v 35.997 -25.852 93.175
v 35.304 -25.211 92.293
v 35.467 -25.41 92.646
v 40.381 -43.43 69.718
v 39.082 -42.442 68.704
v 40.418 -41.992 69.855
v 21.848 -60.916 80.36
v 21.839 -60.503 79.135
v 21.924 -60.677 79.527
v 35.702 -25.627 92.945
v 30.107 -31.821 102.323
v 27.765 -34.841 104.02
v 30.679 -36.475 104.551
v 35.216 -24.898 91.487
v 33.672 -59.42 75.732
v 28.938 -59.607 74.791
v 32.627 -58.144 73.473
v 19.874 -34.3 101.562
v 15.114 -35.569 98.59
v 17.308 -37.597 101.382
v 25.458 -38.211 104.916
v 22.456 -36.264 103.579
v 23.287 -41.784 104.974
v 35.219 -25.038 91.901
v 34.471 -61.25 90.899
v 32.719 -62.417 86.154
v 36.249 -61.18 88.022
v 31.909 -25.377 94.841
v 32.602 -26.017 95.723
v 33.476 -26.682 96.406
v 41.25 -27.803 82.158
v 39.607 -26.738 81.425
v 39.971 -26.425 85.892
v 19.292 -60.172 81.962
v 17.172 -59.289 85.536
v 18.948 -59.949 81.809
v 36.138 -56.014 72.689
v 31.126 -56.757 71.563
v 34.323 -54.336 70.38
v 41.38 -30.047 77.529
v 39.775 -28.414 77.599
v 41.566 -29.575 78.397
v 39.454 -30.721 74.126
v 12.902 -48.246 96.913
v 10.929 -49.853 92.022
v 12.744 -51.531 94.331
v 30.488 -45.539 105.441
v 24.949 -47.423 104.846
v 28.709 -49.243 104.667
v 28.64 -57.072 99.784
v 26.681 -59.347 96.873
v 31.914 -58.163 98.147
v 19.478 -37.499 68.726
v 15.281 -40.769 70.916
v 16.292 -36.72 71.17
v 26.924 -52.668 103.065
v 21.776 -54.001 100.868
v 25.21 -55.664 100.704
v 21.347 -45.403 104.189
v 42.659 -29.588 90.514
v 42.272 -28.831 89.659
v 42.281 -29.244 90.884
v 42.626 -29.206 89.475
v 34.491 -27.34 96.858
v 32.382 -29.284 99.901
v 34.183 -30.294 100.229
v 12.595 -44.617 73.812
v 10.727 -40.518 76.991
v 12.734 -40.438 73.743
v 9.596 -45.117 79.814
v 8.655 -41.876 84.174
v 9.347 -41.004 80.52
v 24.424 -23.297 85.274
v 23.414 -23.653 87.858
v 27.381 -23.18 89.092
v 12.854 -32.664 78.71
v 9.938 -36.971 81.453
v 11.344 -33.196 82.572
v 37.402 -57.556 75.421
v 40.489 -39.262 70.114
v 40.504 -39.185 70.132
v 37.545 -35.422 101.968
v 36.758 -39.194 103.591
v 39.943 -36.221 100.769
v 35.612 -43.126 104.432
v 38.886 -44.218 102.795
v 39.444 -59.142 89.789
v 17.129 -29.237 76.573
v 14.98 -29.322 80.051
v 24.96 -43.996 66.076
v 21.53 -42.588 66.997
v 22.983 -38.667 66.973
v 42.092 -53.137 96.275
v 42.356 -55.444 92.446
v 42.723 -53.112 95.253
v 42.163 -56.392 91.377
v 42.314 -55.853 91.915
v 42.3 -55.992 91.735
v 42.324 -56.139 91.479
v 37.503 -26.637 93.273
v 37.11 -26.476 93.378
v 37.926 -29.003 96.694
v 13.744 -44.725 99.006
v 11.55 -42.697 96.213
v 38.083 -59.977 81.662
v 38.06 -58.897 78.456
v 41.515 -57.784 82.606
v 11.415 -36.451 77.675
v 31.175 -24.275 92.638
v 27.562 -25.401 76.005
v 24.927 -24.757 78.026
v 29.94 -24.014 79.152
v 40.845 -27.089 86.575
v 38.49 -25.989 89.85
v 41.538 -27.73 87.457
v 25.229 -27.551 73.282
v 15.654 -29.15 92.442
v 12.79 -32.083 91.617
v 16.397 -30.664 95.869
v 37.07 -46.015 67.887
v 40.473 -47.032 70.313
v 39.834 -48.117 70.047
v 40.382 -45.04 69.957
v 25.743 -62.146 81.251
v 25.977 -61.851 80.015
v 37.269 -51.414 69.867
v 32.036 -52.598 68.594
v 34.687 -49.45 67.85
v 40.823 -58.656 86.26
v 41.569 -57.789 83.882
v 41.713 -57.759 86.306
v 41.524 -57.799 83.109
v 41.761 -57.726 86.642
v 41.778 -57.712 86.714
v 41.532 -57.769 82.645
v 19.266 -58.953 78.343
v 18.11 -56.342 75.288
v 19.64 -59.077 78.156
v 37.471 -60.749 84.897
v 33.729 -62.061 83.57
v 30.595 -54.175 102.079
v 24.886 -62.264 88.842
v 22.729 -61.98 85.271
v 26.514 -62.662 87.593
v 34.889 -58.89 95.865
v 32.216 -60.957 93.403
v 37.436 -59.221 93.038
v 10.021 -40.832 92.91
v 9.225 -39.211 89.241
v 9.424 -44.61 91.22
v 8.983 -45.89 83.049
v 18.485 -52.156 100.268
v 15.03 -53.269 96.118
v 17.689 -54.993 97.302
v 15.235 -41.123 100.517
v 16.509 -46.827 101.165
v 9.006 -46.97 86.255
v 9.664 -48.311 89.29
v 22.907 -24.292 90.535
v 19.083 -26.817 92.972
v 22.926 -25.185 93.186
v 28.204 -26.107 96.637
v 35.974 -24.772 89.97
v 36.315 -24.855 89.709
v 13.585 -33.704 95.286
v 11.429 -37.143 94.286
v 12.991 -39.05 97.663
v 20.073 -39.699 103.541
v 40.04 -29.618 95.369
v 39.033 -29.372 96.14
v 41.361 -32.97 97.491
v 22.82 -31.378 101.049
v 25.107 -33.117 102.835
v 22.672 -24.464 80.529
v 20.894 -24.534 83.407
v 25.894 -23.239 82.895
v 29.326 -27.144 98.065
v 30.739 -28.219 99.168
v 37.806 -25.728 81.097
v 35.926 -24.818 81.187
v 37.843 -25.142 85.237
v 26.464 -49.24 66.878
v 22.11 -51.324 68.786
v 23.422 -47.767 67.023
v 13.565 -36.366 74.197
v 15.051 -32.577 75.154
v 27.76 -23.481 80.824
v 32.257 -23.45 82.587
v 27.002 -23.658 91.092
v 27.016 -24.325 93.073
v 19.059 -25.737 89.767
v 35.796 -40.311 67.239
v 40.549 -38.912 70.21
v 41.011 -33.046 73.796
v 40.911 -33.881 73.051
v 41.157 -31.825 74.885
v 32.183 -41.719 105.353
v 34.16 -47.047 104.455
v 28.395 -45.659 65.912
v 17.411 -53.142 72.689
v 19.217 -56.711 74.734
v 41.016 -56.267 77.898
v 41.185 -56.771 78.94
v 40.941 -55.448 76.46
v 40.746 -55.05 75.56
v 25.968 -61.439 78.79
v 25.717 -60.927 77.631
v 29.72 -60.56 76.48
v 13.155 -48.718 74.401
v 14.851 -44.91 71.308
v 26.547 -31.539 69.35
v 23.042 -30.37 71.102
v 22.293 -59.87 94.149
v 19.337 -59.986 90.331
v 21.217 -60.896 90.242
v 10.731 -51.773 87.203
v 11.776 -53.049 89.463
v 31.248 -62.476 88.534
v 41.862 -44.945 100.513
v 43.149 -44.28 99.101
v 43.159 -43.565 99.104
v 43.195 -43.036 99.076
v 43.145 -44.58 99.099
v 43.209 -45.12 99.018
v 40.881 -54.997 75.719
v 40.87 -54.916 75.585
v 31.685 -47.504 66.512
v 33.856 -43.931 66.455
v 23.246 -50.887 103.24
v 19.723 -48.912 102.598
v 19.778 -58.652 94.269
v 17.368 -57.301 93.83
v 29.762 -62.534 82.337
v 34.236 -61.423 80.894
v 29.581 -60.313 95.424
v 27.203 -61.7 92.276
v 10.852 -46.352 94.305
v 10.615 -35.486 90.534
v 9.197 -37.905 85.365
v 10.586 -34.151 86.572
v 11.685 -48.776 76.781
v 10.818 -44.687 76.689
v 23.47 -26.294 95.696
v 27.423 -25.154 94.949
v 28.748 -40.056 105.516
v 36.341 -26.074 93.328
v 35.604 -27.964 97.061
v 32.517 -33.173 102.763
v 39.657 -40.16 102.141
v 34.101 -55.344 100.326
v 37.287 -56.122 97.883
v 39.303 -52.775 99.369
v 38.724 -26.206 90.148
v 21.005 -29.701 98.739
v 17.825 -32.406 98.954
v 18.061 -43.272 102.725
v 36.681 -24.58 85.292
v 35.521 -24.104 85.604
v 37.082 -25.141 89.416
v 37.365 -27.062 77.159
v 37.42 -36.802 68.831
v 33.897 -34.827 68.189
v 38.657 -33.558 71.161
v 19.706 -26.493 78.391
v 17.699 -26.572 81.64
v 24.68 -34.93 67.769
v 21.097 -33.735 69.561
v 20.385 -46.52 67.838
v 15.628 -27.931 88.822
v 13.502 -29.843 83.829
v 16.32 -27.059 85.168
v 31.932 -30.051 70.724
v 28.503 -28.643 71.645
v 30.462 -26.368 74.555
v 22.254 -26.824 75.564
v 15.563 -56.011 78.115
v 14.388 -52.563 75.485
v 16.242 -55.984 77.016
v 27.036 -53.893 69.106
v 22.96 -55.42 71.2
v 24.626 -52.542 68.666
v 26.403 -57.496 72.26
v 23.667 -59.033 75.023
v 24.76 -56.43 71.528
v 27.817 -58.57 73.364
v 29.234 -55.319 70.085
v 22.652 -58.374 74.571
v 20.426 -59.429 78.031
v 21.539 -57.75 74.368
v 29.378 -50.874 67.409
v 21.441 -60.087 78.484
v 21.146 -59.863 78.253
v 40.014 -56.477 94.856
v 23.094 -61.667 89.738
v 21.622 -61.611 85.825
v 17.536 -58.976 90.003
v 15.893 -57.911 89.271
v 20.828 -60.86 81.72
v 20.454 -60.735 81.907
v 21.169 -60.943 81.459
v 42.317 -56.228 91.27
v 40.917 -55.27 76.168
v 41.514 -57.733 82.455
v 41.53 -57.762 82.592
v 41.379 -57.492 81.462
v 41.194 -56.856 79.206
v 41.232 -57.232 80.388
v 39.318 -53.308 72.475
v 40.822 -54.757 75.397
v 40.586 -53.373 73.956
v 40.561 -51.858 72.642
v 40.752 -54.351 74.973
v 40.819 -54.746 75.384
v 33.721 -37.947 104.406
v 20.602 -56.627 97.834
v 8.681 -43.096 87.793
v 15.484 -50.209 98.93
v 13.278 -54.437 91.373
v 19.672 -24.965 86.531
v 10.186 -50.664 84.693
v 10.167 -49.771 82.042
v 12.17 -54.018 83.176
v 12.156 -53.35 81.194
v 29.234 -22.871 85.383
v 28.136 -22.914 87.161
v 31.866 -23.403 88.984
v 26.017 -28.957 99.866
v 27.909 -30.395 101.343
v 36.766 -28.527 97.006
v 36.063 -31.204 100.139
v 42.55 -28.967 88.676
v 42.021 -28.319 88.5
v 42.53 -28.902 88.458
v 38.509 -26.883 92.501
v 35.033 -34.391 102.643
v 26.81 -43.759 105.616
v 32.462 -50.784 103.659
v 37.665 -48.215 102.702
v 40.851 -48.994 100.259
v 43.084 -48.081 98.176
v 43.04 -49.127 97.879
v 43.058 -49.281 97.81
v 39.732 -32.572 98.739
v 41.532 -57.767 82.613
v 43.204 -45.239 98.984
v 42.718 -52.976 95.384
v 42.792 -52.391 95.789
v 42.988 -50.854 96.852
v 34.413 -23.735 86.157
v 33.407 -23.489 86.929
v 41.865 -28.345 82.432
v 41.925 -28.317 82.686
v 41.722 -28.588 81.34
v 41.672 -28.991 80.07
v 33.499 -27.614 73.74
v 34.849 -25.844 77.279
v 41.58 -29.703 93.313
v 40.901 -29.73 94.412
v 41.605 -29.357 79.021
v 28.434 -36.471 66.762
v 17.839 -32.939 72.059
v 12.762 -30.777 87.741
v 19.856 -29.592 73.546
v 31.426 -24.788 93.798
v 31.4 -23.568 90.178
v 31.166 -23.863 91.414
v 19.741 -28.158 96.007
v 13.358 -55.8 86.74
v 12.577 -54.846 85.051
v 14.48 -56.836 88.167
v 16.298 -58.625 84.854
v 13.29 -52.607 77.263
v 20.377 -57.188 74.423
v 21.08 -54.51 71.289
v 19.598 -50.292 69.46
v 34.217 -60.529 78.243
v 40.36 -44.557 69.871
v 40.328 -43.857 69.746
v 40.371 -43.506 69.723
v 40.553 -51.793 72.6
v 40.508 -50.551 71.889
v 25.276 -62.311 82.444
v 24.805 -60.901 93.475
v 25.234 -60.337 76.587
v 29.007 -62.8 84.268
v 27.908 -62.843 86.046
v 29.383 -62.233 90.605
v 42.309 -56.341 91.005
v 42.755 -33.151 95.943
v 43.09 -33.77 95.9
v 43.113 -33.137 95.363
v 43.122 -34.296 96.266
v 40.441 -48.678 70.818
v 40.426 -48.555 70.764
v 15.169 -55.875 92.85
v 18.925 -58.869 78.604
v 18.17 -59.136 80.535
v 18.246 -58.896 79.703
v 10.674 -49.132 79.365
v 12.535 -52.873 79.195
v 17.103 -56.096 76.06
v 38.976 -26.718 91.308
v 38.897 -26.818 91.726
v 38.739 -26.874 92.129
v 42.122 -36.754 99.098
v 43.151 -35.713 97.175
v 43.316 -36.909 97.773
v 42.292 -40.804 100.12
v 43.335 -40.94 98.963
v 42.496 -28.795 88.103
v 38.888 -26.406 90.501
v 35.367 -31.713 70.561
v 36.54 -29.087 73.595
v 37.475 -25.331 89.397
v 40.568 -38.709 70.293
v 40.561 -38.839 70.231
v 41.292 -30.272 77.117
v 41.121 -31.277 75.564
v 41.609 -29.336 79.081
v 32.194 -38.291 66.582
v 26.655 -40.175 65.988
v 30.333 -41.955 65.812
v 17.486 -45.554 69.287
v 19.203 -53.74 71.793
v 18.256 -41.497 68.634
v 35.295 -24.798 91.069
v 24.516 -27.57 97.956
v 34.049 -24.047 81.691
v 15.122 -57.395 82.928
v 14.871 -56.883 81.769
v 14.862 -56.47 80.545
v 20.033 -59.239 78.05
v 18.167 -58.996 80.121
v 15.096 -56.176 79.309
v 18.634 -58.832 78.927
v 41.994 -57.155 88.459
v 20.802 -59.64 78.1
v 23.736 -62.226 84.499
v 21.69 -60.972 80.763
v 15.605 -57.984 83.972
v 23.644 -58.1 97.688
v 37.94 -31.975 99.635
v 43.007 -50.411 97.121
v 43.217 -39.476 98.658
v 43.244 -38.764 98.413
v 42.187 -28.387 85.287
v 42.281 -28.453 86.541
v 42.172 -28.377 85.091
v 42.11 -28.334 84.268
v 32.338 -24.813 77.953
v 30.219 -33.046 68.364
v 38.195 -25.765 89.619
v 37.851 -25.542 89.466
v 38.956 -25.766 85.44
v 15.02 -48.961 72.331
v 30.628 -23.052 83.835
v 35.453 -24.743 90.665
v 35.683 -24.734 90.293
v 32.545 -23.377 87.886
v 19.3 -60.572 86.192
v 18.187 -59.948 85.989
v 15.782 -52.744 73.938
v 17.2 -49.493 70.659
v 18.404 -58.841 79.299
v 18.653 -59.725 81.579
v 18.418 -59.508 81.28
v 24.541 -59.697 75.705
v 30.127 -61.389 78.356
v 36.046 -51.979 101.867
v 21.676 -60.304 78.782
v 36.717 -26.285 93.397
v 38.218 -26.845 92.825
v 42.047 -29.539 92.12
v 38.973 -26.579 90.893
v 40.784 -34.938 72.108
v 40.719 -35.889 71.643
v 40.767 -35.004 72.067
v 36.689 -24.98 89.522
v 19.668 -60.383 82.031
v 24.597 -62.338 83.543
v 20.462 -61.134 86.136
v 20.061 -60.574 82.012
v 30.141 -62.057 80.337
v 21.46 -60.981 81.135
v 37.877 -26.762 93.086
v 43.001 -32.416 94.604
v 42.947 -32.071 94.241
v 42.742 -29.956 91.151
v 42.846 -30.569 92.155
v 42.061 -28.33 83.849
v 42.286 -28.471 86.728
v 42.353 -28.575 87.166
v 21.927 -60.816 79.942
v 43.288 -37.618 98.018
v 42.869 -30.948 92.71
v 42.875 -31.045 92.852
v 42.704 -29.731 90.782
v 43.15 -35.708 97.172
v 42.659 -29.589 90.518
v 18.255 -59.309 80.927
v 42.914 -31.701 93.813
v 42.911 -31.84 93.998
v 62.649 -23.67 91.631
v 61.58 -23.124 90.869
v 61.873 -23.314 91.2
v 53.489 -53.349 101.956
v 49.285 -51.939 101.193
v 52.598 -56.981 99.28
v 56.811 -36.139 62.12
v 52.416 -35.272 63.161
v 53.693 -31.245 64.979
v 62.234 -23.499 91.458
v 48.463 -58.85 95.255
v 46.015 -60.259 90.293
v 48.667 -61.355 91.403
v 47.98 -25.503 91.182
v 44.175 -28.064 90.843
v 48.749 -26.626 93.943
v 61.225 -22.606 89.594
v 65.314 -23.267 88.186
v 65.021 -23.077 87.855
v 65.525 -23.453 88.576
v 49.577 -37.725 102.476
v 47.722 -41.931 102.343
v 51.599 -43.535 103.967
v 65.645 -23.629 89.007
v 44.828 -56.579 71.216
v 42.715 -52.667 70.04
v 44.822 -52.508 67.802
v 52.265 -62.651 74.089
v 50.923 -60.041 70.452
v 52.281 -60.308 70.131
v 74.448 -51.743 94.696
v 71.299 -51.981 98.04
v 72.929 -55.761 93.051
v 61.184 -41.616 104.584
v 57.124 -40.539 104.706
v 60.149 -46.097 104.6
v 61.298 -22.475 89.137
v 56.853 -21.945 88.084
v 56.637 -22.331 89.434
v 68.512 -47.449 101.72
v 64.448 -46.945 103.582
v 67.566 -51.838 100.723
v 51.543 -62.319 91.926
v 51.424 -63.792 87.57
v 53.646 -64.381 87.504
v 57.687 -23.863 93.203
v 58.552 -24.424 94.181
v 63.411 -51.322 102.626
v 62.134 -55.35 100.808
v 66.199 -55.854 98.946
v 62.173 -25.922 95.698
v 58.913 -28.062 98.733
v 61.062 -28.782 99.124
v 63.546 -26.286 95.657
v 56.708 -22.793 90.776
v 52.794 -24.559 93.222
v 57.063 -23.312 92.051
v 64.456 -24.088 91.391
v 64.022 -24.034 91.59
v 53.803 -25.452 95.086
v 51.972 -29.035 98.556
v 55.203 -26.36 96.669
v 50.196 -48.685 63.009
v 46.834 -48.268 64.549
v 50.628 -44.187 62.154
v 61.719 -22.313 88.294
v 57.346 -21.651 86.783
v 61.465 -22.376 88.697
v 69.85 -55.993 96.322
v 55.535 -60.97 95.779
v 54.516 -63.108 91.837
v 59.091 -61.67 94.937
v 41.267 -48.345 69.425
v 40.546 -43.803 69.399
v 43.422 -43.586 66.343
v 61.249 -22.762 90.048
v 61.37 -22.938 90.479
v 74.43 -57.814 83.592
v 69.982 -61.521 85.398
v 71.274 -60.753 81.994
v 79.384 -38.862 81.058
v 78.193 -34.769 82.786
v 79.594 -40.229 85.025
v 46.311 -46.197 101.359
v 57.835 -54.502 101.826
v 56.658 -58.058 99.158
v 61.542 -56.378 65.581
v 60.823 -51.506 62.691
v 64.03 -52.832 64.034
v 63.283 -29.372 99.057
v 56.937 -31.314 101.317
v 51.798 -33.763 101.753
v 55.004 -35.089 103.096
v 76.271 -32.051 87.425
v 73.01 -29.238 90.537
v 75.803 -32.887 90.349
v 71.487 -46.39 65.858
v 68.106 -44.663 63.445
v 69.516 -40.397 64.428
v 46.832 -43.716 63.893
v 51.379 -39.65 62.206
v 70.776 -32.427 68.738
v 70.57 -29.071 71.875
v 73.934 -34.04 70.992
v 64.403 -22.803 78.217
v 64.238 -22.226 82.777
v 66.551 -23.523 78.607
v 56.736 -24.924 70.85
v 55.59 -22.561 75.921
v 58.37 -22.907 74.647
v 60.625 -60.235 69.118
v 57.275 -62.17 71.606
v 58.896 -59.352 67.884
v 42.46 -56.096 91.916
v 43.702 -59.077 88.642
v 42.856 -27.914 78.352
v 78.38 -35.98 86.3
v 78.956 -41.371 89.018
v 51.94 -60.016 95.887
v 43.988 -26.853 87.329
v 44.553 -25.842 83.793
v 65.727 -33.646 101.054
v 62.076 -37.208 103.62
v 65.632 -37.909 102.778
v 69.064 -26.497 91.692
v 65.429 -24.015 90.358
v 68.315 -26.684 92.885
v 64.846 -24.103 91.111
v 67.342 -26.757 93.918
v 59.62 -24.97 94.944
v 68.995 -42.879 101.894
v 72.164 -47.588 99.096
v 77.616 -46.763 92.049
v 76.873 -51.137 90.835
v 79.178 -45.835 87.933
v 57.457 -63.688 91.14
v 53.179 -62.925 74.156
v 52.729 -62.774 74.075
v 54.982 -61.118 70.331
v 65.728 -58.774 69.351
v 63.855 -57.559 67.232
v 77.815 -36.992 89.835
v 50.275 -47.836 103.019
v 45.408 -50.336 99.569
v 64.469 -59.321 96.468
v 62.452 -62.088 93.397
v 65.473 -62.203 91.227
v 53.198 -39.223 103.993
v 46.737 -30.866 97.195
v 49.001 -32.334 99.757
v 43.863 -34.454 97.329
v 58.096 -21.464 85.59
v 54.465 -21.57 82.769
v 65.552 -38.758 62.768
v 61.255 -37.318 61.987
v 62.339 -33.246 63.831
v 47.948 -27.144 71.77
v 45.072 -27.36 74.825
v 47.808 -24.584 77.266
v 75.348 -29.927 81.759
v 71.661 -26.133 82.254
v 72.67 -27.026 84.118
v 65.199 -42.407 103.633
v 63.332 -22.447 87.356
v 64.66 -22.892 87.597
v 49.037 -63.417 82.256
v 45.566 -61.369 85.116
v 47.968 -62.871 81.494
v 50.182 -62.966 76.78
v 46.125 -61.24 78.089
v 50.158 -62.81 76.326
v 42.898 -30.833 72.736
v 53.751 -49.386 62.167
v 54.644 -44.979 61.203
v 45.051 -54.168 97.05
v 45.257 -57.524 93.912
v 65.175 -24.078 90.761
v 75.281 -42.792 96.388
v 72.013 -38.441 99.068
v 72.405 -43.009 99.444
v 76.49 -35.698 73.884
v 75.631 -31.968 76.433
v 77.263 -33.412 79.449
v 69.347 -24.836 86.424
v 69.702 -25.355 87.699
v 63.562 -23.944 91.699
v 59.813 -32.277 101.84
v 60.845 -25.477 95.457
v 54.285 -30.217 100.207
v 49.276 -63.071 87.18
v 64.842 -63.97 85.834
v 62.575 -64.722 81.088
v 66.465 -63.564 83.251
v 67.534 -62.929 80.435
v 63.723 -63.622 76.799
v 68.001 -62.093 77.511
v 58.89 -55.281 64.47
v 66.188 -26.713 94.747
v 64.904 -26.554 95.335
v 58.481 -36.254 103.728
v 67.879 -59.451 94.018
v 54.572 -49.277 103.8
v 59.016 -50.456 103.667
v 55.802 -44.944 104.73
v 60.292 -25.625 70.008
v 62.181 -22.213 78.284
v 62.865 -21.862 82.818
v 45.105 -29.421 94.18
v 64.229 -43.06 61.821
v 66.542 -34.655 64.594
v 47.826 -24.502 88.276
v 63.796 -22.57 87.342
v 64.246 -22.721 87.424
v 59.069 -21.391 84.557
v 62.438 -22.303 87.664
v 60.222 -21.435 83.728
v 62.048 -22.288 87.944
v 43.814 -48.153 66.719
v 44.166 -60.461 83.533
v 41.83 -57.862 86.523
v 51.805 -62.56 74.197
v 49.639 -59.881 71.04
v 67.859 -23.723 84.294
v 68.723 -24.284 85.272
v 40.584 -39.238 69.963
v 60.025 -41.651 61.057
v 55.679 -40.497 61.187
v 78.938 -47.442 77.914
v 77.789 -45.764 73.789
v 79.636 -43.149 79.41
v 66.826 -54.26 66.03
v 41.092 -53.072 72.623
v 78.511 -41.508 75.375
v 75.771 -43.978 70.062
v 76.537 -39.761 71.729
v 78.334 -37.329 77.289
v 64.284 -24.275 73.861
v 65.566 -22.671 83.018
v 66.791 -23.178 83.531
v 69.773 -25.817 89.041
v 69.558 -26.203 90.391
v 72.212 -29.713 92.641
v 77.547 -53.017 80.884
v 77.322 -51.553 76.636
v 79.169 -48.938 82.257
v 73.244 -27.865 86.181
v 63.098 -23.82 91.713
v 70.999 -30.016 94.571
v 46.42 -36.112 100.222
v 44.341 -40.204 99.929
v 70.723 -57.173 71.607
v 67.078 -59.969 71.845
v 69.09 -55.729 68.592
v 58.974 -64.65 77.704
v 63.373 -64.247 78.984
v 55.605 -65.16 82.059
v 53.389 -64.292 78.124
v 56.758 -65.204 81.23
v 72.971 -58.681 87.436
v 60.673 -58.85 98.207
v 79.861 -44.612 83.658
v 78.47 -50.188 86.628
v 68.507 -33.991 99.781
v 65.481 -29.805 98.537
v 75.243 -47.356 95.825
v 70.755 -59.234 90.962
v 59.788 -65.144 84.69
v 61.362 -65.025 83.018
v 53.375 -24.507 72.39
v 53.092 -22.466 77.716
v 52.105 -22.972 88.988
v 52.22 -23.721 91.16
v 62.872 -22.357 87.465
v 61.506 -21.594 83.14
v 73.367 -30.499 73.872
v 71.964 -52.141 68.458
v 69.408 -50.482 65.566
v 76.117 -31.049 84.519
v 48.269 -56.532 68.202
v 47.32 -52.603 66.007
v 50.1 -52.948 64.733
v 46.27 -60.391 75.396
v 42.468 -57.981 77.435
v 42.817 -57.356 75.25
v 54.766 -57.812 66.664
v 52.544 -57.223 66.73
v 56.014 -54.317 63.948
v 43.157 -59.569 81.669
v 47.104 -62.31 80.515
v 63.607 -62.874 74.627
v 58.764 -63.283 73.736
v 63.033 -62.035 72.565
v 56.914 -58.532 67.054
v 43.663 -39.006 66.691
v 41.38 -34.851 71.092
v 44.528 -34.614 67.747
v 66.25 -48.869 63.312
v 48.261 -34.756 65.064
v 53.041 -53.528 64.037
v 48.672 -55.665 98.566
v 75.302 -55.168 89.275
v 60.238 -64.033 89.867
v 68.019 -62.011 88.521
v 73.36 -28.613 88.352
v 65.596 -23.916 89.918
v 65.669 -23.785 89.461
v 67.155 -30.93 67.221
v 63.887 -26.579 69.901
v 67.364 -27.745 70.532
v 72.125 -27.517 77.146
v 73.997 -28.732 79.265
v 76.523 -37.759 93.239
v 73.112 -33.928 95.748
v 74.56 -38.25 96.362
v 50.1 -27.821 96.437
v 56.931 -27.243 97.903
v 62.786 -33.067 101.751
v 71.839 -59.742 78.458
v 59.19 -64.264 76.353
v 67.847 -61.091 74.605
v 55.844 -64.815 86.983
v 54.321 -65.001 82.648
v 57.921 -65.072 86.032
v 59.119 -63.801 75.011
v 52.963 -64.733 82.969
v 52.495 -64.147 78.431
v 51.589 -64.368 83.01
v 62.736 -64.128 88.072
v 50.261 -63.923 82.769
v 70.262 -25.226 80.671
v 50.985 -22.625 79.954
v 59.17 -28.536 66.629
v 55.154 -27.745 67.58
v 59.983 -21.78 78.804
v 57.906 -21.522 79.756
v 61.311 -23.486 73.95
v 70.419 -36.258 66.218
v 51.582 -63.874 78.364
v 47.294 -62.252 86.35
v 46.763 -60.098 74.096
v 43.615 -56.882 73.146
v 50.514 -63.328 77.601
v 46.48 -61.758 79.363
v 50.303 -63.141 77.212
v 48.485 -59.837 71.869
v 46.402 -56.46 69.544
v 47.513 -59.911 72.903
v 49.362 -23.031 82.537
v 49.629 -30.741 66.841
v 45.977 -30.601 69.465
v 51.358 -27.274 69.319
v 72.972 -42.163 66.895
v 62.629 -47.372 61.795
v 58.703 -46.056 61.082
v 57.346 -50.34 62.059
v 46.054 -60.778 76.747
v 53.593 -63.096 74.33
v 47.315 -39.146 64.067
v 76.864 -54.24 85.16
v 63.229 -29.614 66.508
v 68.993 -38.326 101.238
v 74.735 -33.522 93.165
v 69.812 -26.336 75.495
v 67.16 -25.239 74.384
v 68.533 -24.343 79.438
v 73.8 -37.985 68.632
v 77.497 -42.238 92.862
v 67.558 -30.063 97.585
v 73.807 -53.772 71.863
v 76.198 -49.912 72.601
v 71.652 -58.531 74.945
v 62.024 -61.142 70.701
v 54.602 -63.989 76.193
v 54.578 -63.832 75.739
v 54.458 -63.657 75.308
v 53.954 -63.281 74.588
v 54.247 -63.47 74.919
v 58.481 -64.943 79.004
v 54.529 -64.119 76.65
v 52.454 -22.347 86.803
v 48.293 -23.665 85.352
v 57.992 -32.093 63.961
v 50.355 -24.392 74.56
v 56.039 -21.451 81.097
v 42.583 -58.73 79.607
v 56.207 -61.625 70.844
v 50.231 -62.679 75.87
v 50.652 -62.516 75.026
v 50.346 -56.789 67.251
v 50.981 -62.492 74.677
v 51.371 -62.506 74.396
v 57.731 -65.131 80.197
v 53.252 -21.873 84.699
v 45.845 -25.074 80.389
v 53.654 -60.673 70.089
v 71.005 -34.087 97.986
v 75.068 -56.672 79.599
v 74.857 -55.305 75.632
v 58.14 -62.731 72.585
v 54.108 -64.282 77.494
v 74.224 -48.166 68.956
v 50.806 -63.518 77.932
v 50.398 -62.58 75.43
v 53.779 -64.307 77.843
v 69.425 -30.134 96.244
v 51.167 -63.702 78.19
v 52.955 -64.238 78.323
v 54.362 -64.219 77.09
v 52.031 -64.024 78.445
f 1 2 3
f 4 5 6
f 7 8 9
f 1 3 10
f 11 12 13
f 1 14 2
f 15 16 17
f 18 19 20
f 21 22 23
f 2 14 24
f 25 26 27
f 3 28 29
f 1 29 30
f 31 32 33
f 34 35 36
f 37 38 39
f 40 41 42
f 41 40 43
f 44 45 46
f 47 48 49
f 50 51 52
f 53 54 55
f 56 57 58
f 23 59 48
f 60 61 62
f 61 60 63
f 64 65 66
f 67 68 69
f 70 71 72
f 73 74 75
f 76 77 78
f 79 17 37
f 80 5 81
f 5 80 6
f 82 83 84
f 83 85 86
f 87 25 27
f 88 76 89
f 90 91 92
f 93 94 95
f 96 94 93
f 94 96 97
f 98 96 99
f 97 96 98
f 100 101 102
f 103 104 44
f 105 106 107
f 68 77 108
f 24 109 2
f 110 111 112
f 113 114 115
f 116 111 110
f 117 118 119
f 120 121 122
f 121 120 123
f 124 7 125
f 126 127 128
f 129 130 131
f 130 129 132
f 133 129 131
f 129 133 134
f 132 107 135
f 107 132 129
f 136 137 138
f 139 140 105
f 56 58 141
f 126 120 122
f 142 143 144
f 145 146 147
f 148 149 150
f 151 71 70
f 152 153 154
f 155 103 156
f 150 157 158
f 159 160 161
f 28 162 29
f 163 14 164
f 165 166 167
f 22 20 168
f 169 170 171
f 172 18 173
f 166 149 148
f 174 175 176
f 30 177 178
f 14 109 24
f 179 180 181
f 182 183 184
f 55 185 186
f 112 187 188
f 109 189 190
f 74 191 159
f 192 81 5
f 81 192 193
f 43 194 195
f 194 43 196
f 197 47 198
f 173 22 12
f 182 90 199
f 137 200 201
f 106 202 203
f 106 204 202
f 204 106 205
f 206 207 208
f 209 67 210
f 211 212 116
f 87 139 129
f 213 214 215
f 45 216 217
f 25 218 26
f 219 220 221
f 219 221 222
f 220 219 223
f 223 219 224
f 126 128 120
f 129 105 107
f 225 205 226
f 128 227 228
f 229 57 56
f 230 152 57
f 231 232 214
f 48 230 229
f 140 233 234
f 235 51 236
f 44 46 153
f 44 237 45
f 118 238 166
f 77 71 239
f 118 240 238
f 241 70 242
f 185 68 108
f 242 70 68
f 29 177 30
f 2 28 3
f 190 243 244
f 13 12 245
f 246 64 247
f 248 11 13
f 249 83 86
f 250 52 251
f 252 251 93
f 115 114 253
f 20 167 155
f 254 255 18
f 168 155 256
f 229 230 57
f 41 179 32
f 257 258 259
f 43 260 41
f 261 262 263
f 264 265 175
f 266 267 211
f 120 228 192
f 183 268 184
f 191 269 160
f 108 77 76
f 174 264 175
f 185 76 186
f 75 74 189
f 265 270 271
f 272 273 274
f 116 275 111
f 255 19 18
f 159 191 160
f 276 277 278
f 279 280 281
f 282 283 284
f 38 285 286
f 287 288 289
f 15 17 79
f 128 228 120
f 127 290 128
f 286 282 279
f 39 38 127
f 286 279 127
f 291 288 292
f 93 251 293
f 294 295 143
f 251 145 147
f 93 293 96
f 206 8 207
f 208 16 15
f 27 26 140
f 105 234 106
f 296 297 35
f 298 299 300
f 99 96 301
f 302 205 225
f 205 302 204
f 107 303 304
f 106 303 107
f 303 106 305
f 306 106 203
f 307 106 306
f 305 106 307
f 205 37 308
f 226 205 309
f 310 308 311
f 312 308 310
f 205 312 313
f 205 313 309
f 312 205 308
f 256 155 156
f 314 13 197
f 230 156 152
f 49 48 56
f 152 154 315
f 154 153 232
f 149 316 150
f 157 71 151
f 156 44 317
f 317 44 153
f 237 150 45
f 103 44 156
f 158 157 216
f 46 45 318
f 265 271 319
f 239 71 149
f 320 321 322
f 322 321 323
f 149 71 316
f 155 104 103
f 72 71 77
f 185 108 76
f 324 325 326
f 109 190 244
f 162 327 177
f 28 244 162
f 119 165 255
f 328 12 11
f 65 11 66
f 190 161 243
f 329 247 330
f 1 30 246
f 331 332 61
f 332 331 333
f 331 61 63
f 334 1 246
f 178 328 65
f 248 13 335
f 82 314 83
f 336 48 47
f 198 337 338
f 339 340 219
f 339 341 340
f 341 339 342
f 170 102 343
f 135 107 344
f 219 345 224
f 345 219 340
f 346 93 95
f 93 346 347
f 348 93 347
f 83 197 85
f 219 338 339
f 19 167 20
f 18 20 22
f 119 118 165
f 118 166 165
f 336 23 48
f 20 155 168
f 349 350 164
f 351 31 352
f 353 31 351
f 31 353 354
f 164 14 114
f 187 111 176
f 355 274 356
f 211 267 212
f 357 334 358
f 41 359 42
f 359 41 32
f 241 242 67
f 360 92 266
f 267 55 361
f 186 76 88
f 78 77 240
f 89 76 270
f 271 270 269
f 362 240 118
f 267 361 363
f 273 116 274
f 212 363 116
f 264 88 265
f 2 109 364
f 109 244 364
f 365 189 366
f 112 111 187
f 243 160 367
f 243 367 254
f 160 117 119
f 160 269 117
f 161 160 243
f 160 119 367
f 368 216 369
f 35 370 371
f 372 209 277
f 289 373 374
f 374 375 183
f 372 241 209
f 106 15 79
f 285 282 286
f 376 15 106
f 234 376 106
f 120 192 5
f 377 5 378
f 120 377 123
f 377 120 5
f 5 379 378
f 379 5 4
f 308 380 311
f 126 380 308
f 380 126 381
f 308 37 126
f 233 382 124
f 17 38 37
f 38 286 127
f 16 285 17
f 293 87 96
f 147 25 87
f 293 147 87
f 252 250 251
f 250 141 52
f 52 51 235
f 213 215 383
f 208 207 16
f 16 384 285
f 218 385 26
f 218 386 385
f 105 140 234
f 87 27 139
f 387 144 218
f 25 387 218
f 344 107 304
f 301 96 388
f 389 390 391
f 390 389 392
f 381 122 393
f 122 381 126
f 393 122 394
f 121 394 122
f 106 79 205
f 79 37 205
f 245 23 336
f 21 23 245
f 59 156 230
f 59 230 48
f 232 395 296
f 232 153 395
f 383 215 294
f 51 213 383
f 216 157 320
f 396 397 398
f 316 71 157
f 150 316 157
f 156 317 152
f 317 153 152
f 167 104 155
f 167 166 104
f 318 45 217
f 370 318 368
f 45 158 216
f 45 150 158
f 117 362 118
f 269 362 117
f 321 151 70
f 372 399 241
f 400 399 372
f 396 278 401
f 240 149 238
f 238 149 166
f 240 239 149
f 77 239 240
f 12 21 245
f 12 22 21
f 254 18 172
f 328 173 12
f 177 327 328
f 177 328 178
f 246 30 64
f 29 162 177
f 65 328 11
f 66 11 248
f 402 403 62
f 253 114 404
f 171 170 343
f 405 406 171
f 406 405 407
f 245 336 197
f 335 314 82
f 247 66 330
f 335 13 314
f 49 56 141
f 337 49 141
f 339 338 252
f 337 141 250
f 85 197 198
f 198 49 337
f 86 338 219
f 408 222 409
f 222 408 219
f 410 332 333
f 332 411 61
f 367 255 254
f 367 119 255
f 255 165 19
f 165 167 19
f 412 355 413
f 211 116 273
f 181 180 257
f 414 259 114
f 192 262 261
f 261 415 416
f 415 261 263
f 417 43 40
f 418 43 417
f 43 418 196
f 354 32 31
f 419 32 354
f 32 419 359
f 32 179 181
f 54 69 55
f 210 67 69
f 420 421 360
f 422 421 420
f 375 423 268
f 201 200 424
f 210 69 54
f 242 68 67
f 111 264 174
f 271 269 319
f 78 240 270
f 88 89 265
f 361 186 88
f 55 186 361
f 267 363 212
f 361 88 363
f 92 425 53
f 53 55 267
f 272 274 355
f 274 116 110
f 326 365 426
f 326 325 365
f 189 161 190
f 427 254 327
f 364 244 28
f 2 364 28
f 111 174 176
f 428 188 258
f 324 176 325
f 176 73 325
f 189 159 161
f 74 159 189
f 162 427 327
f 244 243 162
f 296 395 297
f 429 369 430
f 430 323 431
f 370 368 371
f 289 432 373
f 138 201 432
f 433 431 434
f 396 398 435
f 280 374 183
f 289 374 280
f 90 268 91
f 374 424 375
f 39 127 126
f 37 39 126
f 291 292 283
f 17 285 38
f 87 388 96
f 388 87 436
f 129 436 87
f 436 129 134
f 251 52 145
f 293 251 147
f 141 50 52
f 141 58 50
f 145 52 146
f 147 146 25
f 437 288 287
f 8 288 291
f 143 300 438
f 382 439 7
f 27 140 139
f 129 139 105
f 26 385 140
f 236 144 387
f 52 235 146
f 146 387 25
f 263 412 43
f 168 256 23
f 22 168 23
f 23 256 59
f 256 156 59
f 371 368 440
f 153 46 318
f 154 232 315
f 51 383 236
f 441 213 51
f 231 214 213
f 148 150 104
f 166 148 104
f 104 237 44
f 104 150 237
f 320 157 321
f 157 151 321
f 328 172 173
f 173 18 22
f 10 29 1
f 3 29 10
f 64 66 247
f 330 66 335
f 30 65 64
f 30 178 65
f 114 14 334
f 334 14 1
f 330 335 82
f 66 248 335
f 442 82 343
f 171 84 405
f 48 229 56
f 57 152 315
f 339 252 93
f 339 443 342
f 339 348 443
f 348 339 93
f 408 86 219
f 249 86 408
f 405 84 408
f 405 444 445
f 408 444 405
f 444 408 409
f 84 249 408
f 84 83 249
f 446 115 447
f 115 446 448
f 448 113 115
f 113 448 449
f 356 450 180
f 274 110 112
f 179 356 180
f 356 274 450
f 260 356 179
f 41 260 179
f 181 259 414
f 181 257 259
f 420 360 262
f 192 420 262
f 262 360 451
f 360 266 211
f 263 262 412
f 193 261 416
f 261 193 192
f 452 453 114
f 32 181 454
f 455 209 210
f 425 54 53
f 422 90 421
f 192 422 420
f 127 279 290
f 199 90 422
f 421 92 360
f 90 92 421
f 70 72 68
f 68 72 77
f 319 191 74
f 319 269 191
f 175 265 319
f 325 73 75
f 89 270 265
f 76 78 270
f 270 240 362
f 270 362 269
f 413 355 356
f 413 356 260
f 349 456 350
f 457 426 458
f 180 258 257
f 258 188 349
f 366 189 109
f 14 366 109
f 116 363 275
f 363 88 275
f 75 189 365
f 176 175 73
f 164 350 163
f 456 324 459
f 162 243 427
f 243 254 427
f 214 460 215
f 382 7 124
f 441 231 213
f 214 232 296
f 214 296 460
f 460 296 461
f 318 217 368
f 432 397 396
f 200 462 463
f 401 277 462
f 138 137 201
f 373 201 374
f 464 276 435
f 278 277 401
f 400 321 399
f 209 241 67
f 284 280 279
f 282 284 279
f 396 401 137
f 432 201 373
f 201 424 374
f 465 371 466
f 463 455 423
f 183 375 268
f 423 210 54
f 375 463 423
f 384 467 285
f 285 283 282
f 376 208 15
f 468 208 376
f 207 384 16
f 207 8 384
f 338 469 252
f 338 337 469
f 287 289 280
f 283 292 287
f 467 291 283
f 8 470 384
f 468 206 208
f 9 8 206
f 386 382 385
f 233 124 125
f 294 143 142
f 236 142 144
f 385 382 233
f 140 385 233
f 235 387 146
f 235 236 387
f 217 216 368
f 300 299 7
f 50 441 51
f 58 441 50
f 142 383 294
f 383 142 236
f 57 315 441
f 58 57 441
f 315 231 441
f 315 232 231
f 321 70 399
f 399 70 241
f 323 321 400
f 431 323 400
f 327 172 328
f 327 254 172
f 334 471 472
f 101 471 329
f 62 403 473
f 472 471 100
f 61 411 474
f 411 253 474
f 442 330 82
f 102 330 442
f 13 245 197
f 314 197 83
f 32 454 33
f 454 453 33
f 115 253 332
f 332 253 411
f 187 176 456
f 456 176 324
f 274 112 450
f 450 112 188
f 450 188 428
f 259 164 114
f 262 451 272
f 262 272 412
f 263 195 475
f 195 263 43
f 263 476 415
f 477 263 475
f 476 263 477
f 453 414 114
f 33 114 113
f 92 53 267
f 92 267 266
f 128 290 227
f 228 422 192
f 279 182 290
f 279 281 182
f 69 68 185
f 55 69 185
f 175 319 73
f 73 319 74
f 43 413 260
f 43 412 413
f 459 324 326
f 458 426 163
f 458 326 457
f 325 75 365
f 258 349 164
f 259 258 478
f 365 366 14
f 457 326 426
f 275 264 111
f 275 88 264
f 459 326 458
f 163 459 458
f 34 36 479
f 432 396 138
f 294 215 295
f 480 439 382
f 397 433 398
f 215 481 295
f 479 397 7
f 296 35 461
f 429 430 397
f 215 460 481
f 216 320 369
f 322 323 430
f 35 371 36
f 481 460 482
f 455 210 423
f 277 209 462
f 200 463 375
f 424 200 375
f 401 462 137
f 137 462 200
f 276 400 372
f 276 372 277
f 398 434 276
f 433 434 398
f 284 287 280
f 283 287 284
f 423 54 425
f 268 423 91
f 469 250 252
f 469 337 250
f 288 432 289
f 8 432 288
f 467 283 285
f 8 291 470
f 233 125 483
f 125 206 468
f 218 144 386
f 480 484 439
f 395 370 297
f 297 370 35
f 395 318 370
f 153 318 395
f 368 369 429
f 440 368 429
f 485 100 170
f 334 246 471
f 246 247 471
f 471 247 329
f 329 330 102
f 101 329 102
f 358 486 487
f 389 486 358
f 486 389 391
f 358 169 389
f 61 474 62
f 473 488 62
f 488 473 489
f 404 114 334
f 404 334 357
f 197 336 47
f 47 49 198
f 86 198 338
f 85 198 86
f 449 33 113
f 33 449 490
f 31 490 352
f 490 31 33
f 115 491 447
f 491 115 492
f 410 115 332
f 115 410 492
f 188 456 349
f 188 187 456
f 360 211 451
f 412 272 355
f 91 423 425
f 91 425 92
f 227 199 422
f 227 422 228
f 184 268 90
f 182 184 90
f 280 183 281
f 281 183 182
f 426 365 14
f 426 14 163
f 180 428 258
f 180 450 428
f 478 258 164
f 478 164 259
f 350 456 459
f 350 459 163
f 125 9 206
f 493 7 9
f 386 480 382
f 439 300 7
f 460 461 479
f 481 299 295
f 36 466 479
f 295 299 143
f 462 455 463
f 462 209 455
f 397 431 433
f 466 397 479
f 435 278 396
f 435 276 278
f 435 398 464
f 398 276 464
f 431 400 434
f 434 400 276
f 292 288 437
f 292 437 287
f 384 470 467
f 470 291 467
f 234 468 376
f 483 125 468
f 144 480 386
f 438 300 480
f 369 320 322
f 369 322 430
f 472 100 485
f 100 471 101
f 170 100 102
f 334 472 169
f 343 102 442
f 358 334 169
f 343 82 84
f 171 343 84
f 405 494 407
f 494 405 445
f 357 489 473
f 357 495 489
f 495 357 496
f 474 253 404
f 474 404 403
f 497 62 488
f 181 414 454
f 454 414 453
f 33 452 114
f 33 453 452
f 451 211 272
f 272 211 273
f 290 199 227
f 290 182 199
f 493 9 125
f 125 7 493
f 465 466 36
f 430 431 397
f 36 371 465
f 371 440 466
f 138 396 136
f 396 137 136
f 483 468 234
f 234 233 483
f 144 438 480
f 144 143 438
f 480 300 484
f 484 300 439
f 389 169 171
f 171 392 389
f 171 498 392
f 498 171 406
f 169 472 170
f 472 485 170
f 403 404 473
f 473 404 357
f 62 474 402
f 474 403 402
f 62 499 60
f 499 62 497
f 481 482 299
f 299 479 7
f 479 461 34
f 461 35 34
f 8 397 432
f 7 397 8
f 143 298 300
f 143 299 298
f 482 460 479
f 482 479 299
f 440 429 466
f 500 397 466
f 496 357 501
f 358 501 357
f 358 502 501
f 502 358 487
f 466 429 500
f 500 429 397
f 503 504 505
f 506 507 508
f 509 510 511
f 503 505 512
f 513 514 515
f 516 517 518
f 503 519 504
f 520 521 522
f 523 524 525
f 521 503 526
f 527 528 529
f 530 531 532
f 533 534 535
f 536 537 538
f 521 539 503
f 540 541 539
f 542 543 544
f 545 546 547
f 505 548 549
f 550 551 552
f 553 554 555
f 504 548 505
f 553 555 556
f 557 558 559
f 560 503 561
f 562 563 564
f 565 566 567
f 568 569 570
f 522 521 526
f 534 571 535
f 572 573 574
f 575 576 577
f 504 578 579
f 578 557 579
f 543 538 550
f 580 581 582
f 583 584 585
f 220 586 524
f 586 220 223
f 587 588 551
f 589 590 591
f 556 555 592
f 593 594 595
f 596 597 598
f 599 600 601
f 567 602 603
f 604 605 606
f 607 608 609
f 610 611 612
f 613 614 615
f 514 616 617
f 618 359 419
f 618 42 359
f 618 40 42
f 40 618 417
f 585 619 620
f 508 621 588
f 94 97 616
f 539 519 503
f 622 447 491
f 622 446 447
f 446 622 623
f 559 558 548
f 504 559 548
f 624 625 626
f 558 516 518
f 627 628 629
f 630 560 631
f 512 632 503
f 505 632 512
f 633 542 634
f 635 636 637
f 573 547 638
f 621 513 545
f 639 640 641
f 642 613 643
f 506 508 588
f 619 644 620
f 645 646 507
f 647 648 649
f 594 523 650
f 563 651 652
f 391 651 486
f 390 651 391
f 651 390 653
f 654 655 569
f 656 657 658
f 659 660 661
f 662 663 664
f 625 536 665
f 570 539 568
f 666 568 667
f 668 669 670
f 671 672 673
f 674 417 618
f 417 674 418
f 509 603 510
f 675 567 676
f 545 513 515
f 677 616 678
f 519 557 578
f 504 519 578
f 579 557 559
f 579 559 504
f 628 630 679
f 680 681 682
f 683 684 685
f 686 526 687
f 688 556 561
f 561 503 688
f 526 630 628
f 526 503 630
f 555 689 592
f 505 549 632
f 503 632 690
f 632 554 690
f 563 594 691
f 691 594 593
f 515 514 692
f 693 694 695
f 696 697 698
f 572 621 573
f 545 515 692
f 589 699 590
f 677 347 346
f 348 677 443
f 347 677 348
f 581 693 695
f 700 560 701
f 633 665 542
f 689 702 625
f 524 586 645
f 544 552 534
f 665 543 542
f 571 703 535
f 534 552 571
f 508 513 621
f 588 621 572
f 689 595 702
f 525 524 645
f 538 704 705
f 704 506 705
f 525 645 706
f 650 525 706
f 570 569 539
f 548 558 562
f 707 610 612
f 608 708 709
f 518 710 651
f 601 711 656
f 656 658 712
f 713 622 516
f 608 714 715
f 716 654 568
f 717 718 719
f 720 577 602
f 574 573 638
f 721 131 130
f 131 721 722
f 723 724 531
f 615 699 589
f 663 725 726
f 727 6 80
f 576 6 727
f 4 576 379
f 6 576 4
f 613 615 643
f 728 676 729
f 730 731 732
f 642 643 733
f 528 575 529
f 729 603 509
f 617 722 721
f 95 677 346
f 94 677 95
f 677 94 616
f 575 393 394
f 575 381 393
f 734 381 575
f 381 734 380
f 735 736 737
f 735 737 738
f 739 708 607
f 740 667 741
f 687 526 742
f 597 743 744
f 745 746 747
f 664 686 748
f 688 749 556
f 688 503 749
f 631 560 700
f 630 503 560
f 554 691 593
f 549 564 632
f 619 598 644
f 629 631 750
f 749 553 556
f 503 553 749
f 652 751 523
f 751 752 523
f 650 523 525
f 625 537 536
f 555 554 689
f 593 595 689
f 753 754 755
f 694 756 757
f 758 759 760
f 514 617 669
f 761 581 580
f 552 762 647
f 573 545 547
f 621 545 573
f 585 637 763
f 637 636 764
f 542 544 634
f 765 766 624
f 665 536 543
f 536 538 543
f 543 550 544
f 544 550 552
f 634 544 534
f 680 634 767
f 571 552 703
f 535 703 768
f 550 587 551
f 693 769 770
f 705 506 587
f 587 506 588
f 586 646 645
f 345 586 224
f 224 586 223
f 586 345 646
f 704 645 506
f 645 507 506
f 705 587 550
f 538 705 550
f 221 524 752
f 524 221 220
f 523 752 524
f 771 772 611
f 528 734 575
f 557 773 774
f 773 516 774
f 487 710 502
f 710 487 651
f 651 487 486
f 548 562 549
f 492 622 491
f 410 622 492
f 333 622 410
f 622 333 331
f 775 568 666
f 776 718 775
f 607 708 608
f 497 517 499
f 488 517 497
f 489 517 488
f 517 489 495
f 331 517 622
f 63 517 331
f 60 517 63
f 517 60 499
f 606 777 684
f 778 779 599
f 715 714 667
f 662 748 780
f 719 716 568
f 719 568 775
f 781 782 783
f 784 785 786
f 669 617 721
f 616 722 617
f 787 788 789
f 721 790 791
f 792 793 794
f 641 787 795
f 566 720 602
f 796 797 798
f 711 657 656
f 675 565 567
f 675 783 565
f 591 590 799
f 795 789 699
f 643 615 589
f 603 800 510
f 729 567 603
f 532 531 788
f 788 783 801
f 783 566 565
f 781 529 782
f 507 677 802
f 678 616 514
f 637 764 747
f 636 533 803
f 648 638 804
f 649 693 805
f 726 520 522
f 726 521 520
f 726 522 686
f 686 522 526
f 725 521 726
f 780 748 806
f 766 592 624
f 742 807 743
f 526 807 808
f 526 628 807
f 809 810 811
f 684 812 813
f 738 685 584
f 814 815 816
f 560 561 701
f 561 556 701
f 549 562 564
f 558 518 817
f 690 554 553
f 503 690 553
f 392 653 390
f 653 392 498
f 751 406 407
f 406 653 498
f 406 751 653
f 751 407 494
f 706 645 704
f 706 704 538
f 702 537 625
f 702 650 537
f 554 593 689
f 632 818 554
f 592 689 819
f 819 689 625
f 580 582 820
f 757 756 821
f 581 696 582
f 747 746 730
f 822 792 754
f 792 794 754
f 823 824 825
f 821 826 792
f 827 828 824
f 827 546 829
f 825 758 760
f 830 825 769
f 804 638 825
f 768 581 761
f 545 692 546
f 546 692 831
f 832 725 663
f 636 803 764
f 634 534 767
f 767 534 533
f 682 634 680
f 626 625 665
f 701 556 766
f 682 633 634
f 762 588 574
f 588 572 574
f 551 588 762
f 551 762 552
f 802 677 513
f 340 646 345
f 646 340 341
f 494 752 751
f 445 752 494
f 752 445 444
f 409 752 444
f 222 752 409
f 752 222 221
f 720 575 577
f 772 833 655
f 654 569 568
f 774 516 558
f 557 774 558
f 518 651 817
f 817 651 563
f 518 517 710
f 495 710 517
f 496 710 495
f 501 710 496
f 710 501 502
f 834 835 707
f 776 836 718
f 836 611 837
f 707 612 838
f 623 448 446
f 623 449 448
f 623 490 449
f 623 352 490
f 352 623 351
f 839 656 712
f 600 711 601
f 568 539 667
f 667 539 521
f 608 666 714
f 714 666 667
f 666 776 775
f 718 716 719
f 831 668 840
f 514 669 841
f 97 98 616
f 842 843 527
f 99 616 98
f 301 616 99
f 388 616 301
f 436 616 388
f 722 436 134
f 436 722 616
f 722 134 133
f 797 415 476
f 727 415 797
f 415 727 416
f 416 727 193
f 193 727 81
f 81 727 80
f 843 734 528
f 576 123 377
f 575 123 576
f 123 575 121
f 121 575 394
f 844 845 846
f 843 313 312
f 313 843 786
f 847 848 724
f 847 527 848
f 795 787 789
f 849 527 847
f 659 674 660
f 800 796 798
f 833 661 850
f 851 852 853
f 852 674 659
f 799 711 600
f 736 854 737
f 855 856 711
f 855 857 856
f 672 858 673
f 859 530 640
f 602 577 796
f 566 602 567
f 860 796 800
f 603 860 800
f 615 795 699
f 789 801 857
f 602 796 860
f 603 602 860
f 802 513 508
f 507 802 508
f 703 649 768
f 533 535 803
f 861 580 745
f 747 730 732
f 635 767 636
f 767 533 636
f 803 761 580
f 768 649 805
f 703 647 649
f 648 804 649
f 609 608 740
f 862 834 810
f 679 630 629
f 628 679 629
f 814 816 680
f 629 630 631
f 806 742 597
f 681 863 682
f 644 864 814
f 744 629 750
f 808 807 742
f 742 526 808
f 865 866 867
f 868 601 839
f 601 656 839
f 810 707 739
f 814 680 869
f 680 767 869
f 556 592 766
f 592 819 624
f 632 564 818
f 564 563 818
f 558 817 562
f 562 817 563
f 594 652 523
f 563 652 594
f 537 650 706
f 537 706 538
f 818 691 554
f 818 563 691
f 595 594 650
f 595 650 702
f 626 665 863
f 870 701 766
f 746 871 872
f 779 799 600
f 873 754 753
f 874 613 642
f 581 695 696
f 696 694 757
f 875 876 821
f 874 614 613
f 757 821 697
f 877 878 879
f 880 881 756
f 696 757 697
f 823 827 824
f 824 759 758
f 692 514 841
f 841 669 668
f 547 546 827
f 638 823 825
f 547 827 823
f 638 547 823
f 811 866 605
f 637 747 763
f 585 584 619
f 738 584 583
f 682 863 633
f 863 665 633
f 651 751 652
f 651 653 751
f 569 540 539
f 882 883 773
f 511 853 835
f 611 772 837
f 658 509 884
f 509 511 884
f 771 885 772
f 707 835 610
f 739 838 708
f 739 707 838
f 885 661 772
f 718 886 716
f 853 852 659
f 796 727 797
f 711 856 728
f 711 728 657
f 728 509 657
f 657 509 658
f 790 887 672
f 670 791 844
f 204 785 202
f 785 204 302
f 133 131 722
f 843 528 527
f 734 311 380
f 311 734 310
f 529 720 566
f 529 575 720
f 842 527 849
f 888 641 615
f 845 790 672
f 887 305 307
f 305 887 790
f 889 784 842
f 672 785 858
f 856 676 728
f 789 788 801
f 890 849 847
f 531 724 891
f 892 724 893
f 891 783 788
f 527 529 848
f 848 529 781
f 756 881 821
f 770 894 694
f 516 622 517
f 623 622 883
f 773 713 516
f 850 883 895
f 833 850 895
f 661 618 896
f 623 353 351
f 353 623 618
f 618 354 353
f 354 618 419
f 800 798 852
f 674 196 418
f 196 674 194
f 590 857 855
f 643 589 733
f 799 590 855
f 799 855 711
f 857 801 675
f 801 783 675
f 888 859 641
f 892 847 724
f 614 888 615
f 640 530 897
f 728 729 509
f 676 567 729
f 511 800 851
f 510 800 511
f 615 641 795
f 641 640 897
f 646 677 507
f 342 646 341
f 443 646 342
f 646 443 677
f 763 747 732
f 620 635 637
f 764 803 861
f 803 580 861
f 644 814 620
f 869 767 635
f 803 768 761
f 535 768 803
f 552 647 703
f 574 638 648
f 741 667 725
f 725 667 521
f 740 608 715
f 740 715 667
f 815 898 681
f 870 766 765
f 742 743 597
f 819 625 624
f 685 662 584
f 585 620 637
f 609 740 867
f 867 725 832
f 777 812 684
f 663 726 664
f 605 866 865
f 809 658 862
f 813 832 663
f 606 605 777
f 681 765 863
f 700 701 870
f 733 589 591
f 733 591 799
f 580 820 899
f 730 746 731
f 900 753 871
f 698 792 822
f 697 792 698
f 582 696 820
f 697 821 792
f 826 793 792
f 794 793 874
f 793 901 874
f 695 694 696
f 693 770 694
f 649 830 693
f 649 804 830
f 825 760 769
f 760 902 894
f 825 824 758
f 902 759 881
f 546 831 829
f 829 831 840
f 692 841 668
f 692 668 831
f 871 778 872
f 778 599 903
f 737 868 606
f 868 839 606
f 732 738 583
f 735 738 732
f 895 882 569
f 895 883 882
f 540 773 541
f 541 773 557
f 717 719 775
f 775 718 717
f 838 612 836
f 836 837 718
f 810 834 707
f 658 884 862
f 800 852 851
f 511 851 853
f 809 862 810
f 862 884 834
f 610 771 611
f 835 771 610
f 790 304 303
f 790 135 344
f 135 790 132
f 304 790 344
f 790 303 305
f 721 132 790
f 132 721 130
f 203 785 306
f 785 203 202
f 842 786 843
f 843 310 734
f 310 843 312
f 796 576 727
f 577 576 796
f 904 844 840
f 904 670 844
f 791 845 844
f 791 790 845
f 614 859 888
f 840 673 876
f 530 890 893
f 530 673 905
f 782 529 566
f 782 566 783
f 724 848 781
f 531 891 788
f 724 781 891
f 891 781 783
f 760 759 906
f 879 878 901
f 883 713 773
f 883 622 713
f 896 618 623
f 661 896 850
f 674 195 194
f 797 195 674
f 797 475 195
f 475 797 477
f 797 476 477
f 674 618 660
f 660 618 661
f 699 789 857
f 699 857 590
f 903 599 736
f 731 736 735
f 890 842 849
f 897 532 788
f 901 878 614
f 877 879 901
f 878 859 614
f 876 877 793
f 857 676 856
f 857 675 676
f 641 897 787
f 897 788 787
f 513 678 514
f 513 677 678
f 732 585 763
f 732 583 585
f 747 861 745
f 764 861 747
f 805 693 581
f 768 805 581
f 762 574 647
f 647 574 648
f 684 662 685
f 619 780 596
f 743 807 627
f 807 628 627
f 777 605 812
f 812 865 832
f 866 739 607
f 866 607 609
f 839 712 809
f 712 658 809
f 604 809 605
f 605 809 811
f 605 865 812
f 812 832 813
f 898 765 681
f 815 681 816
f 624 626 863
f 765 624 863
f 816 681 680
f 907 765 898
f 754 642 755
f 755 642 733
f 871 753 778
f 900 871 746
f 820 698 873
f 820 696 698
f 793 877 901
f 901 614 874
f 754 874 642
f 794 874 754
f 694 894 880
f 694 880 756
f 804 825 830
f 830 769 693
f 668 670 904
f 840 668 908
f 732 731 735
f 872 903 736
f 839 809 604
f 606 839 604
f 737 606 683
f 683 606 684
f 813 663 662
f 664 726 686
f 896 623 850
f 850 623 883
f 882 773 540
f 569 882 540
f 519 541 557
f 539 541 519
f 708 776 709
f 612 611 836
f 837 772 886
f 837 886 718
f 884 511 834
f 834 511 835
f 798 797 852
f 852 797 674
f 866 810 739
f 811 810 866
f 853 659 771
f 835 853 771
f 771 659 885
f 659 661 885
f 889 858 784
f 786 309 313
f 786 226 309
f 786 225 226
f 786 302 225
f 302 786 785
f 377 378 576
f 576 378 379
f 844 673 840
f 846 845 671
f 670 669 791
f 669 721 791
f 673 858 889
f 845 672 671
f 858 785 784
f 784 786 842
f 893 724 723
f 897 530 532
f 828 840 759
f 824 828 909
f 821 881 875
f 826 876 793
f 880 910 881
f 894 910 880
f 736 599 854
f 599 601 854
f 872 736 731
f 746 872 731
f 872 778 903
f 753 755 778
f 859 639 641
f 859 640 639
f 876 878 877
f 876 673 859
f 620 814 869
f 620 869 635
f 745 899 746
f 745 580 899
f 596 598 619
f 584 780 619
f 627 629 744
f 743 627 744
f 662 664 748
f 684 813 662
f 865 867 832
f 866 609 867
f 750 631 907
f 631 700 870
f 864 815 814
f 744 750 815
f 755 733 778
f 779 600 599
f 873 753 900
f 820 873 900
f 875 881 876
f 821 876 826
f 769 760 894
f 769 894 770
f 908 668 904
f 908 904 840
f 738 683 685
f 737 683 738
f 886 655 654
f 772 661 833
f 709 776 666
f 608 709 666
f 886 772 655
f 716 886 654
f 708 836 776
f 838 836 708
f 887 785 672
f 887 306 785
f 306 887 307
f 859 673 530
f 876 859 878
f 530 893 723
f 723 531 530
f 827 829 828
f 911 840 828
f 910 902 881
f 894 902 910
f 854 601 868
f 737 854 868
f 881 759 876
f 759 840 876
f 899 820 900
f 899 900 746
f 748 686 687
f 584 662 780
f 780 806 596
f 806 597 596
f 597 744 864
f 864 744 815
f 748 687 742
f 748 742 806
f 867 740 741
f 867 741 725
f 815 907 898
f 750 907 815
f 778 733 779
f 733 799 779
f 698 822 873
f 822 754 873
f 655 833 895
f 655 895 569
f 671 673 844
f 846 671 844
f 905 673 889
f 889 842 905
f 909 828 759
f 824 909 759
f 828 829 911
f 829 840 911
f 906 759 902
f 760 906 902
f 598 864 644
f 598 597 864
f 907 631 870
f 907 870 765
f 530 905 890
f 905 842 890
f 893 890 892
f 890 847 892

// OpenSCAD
$fn=30;

// the original had 10:50, which takes ages
for (i = [10:11])
{
    angle = i*360/20;
    distance = i*10;
    r = i*2;
    rotate(angle, [1, 2, 3])
    translate([0, distance, 0])
    sphere(r = r);
}
